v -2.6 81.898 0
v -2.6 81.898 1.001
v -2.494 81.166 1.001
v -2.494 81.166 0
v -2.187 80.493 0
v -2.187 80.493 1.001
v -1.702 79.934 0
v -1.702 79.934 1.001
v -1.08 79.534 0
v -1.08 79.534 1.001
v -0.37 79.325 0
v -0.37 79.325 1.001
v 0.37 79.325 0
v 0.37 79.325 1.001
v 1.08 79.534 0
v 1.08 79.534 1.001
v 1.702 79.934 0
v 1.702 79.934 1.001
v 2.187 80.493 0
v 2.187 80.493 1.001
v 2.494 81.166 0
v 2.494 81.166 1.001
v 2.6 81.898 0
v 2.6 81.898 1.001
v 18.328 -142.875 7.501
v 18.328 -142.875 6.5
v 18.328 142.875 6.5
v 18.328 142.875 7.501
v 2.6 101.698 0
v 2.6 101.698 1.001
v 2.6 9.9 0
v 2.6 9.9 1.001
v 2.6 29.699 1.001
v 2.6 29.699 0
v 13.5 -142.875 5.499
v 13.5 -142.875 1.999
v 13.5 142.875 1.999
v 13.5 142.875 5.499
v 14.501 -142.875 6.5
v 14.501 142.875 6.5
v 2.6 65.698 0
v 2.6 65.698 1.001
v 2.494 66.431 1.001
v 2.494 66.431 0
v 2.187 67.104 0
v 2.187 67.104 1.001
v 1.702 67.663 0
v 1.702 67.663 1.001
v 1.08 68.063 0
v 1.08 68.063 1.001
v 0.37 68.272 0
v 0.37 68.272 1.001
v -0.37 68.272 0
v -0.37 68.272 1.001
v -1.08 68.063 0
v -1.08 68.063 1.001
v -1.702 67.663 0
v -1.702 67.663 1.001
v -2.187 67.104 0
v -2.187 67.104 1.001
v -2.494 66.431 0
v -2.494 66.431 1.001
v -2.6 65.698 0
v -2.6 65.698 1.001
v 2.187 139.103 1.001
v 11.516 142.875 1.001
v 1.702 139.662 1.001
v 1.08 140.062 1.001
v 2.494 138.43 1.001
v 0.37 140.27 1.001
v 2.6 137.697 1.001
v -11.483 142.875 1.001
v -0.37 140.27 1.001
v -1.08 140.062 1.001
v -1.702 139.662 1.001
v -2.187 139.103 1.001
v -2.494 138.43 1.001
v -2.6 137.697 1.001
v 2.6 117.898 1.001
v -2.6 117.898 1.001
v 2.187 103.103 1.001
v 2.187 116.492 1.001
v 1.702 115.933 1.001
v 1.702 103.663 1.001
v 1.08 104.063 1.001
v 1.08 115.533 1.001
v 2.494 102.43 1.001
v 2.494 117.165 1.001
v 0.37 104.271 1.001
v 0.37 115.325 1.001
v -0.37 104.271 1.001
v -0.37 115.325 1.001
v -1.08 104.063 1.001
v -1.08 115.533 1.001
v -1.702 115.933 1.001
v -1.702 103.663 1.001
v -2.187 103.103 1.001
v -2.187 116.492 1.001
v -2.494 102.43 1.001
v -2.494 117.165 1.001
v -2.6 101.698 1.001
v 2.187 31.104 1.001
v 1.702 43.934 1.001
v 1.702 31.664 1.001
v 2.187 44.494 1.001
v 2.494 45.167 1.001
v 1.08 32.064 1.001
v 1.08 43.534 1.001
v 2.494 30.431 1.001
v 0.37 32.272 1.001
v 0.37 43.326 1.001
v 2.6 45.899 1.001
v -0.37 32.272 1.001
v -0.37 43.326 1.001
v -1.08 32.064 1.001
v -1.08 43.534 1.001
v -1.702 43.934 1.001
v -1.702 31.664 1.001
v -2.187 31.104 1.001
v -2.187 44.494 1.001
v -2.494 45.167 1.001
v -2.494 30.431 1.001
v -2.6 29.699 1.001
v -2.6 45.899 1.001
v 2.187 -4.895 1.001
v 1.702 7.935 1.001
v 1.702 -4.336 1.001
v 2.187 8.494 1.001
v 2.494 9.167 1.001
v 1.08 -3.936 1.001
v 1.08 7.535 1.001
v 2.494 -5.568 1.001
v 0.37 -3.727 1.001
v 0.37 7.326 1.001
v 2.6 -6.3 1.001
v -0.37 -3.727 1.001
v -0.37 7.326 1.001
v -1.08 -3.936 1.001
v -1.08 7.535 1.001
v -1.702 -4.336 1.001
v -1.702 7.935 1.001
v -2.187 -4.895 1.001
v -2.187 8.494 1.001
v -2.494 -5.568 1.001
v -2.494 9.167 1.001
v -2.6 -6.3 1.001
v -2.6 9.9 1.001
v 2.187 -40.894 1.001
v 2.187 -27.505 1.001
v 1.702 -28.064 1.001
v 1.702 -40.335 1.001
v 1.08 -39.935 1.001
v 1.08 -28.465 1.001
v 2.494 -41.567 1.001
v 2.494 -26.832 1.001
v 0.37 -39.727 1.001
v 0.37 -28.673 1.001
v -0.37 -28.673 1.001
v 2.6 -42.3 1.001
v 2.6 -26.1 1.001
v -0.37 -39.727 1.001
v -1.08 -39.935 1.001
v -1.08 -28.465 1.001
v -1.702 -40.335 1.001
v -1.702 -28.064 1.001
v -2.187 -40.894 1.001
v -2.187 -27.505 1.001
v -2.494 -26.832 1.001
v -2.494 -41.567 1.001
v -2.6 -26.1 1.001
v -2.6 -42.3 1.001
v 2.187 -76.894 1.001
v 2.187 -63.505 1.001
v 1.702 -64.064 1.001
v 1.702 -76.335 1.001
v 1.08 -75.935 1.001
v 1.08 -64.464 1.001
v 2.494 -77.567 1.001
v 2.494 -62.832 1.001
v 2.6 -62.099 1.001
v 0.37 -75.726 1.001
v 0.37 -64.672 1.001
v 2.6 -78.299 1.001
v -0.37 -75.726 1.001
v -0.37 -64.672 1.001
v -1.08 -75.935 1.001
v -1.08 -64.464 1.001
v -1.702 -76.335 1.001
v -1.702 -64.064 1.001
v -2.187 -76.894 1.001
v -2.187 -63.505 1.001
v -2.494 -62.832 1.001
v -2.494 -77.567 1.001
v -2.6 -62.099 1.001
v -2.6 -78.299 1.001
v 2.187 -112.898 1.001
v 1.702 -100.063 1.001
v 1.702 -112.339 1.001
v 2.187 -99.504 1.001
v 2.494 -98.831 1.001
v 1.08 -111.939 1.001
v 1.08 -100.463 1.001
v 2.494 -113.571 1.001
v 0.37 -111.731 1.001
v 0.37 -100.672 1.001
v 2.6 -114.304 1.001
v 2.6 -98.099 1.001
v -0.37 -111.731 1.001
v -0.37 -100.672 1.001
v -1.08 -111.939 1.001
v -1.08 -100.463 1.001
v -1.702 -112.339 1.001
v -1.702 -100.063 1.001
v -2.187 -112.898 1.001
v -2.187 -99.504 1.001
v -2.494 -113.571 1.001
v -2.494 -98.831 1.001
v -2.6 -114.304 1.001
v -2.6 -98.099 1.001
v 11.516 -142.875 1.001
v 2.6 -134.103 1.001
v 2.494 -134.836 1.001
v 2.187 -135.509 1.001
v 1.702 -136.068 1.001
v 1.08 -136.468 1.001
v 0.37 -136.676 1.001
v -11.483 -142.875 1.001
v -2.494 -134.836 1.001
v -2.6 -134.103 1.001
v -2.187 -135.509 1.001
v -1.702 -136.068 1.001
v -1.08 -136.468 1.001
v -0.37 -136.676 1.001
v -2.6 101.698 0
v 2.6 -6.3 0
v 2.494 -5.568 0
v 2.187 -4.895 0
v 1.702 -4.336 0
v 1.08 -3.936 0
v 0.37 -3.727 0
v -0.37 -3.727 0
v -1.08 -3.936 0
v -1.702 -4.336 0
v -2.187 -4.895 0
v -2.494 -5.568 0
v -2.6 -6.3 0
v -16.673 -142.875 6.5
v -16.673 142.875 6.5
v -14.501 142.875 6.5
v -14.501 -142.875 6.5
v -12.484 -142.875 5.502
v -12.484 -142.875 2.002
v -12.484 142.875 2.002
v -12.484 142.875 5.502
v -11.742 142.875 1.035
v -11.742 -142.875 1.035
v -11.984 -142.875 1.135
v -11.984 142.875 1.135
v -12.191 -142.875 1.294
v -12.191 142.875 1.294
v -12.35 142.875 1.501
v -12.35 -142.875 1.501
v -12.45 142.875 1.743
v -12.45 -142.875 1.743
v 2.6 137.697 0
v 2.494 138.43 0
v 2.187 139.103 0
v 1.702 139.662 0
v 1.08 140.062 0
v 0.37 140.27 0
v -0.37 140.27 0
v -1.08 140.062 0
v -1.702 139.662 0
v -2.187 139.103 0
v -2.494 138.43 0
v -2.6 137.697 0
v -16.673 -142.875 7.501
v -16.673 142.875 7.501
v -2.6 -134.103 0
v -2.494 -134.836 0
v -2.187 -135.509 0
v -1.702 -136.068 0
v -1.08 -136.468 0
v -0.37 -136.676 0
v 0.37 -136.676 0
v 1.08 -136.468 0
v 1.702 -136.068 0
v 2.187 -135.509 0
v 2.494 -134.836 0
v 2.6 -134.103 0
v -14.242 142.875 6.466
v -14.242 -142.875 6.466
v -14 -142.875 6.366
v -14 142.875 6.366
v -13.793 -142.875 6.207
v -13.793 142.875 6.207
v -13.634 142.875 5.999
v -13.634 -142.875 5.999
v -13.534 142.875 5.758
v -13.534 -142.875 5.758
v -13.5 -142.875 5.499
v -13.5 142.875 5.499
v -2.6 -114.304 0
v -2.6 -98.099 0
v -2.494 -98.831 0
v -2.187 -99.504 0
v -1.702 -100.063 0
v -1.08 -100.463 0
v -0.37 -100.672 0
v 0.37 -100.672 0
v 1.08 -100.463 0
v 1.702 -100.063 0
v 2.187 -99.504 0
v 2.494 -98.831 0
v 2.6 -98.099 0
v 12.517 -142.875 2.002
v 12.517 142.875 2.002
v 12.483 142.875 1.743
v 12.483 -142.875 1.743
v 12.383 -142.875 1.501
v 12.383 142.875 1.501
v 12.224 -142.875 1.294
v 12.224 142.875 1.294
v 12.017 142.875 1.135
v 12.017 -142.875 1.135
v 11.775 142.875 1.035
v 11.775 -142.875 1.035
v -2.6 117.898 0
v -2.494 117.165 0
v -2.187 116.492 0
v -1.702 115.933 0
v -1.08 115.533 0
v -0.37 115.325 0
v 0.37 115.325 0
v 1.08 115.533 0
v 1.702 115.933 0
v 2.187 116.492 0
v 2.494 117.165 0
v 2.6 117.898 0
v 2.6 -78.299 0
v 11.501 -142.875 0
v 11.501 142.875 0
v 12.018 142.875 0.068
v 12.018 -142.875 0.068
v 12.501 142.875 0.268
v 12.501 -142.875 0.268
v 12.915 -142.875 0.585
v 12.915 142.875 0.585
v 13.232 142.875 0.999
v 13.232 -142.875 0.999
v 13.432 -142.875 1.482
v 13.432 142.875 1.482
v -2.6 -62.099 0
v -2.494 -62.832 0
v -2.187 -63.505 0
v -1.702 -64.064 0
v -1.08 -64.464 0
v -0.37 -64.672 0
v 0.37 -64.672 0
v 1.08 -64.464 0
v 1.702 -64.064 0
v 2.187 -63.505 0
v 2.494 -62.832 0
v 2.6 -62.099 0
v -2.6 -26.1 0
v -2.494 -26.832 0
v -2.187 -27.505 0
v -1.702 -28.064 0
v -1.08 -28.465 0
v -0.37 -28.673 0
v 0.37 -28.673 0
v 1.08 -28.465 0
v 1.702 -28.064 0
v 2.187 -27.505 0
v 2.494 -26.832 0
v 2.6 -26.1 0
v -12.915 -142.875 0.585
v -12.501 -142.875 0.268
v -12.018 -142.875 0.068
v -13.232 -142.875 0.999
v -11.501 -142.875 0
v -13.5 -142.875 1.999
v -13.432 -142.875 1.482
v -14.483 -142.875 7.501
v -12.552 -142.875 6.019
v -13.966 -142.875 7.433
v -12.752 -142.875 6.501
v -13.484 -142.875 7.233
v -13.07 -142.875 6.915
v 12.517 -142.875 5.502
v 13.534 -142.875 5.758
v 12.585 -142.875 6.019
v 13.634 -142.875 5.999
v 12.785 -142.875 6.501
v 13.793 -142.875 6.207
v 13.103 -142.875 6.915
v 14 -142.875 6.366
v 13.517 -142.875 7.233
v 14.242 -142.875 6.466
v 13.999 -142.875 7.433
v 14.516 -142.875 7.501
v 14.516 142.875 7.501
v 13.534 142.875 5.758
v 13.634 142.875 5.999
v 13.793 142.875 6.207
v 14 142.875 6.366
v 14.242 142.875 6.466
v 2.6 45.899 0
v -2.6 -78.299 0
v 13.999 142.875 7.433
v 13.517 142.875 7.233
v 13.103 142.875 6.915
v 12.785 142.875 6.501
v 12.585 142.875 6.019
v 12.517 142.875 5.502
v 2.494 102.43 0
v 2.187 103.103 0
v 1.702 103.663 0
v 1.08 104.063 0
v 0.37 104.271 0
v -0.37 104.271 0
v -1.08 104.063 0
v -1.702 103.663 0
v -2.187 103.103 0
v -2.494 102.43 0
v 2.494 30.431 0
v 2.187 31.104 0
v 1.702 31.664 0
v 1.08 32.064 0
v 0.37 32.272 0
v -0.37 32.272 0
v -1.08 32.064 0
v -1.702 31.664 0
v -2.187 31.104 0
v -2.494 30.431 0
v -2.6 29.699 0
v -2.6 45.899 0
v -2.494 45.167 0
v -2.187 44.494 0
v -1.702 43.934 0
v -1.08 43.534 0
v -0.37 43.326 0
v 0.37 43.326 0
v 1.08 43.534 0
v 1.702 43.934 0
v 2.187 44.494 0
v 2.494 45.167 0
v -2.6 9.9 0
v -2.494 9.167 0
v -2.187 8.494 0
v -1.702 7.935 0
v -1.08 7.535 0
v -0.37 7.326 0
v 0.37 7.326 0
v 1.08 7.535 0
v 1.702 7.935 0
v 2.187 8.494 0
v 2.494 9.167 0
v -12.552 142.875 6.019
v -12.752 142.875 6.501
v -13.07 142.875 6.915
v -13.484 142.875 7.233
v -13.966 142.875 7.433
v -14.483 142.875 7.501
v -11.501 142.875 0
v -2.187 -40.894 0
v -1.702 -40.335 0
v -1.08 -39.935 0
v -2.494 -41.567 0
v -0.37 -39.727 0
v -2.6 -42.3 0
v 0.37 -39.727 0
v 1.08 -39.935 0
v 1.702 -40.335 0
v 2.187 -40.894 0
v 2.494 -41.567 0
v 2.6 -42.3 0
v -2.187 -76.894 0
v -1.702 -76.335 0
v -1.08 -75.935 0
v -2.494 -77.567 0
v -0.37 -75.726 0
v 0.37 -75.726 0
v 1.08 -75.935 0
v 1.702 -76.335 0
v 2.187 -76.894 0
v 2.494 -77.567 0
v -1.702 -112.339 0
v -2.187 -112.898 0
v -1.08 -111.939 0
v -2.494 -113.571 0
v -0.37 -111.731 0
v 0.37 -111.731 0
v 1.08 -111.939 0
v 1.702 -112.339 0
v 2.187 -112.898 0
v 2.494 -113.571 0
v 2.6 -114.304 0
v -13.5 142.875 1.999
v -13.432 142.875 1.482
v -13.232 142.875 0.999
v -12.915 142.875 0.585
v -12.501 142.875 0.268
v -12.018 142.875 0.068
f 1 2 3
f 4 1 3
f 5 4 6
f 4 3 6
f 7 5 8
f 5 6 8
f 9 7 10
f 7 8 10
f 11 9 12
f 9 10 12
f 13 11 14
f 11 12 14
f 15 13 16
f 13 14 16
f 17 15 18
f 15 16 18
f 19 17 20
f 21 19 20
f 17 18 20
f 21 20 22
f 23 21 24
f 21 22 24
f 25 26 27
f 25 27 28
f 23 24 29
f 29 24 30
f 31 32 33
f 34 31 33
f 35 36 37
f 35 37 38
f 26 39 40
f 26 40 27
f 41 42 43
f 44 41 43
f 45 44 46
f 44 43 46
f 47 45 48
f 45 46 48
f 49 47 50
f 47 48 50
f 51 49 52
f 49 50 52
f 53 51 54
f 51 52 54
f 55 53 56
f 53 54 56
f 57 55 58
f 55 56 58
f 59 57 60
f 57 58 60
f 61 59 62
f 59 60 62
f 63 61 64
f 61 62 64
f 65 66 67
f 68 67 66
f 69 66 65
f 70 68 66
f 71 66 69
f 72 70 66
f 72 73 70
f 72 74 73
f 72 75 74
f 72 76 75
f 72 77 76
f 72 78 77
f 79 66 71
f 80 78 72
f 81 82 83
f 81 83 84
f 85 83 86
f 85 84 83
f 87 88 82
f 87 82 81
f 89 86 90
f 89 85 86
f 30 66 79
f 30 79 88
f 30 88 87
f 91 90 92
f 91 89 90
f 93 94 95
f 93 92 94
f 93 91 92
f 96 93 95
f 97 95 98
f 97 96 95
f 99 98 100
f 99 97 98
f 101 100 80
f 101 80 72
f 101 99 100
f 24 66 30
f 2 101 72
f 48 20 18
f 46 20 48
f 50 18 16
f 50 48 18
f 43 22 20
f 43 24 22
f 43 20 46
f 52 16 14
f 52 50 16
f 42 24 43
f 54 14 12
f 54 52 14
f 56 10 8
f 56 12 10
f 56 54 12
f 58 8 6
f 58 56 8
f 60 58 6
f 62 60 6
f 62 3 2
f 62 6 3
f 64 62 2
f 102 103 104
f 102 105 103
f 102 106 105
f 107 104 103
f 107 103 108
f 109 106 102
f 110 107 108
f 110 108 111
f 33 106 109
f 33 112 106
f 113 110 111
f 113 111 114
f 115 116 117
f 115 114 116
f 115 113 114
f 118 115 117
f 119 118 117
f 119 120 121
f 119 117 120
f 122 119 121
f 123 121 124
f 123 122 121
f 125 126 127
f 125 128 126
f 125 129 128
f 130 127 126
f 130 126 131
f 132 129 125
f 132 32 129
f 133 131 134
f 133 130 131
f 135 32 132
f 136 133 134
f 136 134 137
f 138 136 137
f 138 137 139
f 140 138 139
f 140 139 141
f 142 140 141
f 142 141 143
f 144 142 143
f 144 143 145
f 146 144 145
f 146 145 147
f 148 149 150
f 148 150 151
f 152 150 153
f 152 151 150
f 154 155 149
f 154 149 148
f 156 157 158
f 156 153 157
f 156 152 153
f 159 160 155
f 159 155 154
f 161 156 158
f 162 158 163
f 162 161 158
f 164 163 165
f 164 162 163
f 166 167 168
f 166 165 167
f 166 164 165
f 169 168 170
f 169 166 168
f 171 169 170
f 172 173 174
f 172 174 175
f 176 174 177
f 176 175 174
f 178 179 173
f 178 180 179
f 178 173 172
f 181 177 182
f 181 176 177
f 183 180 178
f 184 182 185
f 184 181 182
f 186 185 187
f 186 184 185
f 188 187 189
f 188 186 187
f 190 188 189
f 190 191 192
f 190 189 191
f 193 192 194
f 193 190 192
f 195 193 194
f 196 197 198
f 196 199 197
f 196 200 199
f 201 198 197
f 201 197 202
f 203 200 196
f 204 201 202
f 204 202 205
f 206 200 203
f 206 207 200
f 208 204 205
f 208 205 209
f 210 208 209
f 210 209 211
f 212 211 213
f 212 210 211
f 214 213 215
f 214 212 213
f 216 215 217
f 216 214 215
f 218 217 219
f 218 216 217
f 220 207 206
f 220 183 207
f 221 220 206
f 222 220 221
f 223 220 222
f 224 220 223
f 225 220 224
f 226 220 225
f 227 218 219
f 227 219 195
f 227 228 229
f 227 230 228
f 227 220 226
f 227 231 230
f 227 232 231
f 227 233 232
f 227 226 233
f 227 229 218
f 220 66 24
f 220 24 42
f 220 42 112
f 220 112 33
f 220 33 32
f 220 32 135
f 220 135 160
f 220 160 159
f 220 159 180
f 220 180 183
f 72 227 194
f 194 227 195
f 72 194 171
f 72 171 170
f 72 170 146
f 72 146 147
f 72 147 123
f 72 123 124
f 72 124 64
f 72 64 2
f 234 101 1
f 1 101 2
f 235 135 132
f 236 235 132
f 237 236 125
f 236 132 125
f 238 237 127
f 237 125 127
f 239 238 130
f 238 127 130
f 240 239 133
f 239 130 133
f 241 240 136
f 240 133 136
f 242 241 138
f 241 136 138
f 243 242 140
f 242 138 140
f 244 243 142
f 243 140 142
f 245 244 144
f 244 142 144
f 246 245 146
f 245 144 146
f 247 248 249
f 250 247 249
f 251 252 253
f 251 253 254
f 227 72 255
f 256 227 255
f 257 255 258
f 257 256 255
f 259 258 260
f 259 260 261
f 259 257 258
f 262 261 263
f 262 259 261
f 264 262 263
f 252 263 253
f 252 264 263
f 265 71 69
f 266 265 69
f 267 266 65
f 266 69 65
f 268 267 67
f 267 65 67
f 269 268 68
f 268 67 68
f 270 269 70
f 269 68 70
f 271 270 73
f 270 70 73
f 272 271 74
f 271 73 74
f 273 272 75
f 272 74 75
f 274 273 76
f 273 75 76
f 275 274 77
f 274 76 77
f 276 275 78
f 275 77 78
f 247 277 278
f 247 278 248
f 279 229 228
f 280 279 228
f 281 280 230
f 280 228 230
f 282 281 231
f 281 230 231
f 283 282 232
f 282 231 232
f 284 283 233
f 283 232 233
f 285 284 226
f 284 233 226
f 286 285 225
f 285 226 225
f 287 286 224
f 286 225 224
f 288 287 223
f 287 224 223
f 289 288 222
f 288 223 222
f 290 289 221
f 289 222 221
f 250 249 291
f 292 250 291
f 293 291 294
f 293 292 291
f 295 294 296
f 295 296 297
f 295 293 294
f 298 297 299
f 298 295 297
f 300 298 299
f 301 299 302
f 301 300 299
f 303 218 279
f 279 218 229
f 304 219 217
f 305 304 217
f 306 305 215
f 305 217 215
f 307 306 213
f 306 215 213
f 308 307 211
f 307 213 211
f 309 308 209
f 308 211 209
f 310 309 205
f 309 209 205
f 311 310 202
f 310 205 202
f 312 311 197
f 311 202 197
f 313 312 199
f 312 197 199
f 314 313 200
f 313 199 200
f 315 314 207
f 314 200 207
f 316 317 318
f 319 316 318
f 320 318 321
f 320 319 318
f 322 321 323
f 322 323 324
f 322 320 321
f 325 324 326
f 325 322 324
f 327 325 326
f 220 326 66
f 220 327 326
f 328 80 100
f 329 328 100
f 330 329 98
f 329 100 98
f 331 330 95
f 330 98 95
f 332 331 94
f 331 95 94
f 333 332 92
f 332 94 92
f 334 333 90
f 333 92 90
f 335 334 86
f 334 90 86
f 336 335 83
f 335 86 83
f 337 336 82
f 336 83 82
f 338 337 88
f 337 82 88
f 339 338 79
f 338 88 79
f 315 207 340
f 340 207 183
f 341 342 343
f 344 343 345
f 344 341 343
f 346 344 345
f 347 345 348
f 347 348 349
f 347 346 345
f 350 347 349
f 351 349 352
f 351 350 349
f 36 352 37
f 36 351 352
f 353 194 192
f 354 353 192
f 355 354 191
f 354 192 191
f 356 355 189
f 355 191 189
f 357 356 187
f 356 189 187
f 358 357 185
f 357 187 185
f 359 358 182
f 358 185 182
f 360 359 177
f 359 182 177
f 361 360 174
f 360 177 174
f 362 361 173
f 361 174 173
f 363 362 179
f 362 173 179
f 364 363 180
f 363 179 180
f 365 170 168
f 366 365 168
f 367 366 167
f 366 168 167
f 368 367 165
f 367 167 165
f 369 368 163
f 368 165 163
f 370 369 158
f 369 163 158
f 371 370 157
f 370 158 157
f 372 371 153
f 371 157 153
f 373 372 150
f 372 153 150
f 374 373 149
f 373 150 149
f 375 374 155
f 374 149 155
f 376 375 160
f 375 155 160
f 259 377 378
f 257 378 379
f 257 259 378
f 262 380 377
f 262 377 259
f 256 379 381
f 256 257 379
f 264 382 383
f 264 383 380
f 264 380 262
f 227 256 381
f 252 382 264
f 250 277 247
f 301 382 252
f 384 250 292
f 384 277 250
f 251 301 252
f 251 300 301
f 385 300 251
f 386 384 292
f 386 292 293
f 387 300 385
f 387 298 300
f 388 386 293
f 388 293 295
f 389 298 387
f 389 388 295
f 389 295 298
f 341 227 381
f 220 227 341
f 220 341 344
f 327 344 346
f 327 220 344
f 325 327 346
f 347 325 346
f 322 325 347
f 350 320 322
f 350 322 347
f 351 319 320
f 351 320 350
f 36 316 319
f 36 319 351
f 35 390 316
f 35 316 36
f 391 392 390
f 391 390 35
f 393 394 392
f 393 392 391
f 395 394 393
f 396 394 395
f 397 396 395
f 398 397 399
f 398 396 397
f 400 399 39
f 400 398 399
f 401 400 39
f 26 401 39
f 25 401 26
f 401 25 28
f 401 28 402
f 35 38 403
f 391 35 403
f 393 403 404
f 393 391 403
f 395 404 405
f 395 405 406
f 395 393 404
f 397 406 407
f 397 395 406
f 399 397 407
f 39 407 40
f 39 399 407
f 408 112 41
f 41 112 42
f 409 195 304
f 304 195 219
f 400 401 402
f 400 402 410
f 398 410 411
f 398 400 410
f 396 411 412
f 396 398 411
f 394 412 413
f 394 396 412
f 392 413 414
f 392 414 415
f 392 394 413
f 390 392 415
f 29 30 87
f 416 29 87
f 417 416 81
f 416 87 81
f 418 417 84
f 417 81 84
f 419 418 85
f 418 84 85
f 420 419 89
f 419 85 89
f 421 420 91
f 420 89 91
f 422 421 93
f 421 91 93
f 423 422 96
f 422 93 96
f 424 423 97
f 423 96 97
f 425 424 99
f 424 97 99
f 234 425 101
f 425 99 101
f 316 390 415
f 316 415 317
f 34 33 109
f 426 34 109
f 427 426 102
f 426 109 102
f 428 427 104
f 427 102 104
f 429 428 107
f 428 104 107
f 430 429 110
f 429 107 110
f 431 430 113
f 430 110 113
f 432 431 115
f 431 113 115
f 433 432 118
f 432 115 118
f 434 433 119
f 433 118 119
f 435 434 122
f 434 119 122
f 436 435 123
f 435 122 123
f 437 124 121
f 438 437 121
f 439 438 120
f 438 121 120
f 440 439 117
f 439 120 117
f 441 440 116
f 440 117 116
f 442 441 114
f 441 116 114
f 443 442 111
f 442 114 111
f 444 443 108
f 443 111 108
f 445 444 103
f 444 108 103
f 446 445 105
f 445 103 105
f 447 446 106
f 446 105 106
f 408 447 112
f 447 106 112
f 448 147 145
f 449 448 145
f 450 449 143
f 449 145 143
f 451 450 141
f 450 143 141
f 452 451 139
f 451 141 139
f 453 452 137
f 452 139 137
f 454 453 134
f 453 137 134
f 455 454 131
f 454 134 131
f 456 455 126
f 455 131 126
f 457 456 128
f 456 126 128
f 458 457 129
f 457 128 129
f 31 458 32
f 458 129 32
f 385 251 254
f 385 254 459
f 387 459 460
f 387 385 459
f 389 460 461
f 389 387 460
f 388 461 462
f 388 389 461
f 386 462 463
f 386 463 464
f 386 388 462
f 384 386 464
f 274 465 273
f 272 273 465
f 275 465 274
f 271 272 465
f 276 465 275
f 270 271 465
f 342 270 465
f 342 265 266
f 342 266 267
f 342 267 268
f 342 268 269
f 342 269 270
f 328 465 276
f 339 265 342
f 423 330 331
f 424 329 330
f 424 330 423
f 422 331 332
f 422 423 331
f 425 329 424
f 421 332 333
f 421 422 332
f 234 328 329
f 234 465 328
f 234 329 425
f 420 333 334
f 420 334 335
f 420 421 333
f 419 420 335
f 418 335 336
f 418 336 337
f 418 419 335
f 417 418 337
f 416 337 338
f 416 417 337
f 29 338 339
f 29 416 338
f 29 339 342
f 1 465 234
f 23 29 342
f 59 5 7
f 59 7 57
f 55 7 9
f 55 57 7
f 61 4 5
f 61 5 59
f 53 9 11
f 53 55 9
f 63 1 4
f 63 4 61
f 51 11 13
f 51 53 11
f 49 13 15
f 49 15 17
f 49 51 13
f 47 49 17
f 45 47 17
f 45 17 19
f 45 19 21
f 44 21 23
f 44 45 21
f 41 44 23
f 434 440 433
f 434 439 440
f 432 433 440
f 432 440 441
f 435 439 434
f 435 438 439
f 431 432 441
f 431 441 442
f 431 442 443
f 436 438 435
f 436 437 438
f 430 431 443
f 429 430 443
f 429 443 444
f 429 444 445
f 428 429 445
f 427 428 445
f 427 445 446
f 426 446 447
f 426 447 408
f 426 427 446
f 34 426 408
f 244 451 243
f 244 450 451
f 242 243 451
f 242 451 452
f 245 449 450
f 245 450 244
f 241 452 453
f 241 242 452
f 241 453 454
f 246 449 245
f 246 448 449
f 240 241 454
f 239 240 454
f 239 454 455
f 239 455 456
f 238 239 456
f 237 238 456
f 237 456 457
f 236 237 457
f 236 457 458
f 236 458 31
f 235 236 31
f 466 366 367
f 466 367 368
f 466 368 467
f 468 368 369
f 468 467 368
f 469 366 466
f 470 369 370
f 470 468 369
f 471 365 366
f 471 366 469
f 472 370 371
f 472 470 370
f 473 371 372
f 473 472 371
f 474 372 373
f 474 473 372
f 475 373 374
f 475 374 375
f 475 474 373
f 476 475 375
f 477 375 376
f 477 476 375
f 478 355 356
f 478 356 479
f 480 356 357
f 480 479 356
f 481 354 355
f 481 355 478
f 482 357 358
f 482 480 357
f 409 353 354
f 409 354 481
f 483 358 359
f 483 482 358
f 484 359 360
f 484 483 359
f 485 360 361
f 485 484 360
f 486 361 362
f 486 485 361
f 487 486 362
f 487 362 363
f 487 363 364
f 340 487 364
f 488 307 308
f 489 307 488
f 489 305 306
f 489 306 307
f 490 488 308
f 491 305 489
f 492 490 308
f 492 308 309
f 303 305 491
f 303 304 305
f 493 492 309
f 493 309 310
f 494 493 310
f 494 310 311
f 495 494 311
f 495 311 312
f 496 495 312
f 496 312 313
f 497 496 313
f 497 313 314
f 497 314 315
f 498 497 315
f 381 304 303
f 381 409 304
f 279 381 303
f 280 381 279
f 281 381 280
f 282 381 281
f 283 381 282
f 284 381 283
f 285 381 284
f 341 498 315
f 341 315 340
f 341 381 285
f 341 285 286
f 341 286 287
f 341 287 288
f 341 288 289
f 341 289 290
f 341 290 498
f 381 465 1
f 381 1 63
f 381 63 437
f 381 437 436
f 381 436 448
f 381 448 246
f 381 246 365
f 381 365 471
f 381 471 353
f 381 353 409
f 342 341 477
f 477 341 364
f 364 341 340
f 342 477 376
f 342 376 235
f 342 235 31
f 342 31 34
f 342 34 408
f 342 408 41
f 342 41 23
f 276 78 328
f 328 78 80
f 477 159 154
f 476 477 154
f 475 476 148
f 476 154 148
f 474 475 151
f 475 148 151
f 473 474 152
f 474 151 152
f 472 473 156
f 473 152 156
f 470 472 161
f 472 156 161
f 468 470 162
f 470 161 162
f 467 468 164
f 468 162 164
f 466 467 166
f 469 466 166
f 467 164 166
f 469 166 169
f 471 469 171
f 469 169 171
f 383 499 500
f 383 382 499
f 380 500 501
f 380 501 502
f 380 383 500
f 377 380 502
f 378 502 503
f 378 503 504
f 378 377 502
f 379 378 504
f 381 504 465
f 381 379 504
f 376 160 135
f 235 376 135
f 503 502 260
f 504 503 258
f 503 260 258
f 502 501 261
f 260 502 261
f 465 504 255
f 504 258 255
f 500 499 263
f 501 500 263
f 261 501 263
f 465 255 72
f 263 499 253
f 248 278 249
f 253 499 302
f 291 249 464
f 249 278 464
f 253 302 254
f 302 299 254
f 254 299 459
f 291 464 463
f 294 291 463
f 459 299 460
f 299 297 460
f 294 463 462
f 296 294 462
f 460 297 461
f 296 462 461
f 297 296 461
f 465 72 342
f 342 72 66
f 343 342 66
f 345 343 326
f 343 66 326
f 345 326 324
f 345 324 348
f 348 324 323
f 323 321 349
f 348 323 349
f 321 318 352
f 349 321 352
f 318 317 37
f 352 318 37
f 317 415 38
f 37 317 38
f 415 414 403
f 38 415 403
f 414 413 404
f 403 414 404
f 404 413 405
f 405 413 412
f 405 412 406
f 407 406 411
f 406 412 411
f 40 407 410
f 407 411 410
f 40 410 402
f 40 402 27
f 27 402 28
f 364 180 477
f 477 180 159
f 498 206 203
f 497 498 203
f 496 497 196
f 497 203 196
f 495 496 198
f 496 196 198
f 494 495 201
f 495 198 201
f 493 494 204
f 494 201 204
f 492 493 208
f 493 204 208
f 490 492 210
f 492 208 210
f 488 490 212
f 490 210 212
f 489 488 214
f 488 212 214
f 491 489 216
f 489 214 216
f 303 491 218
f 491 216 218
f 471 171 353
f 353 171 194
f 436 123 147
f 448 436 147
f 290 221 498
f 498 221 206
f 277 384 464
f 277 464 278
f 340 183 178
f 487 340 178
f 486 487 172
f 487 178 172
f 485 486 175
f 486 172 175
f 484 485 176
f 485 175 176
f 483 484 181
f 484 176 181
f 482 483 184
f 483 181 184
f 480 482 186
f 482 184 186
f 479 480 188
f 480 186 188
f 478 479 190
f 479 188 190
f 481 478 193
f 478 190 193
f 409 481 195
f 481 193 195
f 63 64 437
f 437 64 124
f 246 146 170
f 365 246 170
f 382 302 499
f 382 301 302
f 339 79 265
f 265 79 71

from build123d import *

# Parameters (mm, degrees)
F1_DEPTH = 142.875
F3_DEPTH = 1.00176


with BuildPart() as f1:
    # F0 (on Front) → F1 (new body, symmetric)
    with BuildSketch(Plane.XZ):
        with BuildLine():
            ThreePointArc((-13.5001, 1.99898), (-12.914612, 0.585488), (-11.50112, 0))
            Line((-11.50112, 0), (11.50112, 0))
            ThreePointArc((11.50112, 0), (12.914612, 0.585488), (13.5001, 1.99898))
            Line((13.5001, 1.99898), (13.5001, 5.4991))
            ThreePointArc((13.5001, 5.4991), (13.793216, 6.206744), (14.50086, 6.49986))
            Line((14.50086, 6.49986), (18.328109, 6.49986))
            Line((18.328109, 6.49986), (18.328109, 7.50062))
            Line((18.328109, 7.50062), (14.5161, 7.50062))
            ThreePointArc((14.5161, 7.50062), (13.102608, 6.915132), (12.51712, 5.50164))
            Line((12.51712, 5.50164), (12.51712, 2.00152))
            ThreePointArc((12.51712, 2.00152), (12.224004, 1.293876), (11.51636, 1.00076))
            Line((11.51636, 1.00076), (-11.48334, 1.00076))
            ThreePointArc((-11.48334, 1.00076), (-12.190984, 1.293876), (-12.4841, 2.00152))
            Line((-12.4841, 2.00152), (-12.4841, 5.50164))
            ThreePointArc((-12.4841, 5.50164), (-13.069588, 6.915132), (-14.48308, 7.50062))
            Line((-14.48308, 7.50062), (-16.673091, 7.50062))
            Line((-16.673091, 7.50062), (-16.673091, 6.49986))
            Line((-16.673091, 6.49986), (-14.50086, 6.49986))
            ThreePointArc((-14.50086, 6.49986), (-13.793216, 6.206744), (-13.5001, 5.4991))
            Line((-13.5001, 5.4991), (-13.5001, 1.99898))
        make_face()
    extrude(amount=F1_DEPTH, both=True)

    # F2 (on face) → F3 (cut, through all)
    with BuildSketch(Plane.XY.offset(1.00076)):
        with BuildLine():
            ThreePointArc((2.59969, 29.69895), (0, 32.29864), (-2.59969, 29.69895))
            Line((-2.59969, 29.69895), (-2.59969, 9.89965))
            ThreePointArc((-2.59969, 9.89965), (0, 7.29996), (2.59969, 9.89965))
            Line((2.59969, 9.89965), (2.59969, 29.69895))
        make_face()
        with BuildLine():
            ThreePointArc((-2.59969, 45.89907), (0, 43.29938), (2.59969, 45.89907))
            Line((2.59969, 45.89907), (2.59969, 65.69837))
            ThreePointArc((2.59969, 65.69837), (0, 68.29806), (-2.59969, 65.69837))
            Line((-2.59969, 65.69837), (-2.59969, 45.89907))
        make_face()
        with BuildLine():
            ThreePointArc((-2.59969, 81.89849), (0, 79.2988), (2.59969, 81.89849))
            Line((2.59969, 81.89849), (2.59969, 101.69779))
            ThreePointArc((2.59969, 101.69779), (0, 104.29748), (-2.59969, 101.69779))
            Line((-2.59969, 101.69779), (-2.59969, 81.89849))
        make_face()
        with BuildLine():
            ThreePointArc((-2.59969, 117.89791), (0, 115.29822), (2.59969, 117.89791))
            Line((2.59969, 117.89791), (2.59969, 137.69721))
            ThreePointArc((2.59969, 137.69721), (0, 140.2969), (-2.59969, 137.69721))
            Line((-2.59969, 137.69721), (-2.59969, 117.89791))
        make_face()
        with BuildLine():
            ThreePointArc((-2.59969, -26.09977), (0, -28.69946), (2.59969, -26.09977))
            Line((2.59969, -26.09977), (2.59969, -6.30047))
            ThreePointArc((2.59969, -6.30047), (0, -3.70078), (-2.59969, -6.30047))
            Line((-2.59969, -6.30047), (-2.59969, -26.09977))
        make_face()
        with BuildLine():
            ThreePointArc((-2.59969, -62.09919), (0, -64.69888), (2.59969, -62.09919))
            Line((2.59969, -62.09919), (2.59969, -42.29989))
            ThreePointArc((2.59969, -42.29989), (0, -39.7002), (-2.59969, -42.29989))
            Line((-2.59969, -42.29989), (-2.59969, -62.09919))
        make_face()
        with BuildLine():
            ThreePointArc((-2.59969, -98.09861), (0, -100.6983), (2.59969, -98.09861))
            Line((2.59969, -98.09861), (2.59969, -78.29931))
            ThreePointArc((2.59969, -78.29931), (0, -75.69962), (-2.59969, -78.29931))
            Line((-2.59969, -78.29931), (-2.59969, -98.09861))
        make_face()
        with BuildLine():
            ThreePointArc((-2.59969, -134.10311), (0, -136.7028), (2.59969, -134.10311))
            Line((2.59969, -134.10311), (2.59969, -114.30381))
            ThreePointArc((2.59969, -114.30381), (0, -111.70412), (-2.59969, -114.30381))
            Line((-2.59969, -114.30381), (-2.59969, -134.10311))
        make_face()
    extrude(amount=-F3_DEPTH, mode=Mode.SUBTRACT)


solid = f1.part
